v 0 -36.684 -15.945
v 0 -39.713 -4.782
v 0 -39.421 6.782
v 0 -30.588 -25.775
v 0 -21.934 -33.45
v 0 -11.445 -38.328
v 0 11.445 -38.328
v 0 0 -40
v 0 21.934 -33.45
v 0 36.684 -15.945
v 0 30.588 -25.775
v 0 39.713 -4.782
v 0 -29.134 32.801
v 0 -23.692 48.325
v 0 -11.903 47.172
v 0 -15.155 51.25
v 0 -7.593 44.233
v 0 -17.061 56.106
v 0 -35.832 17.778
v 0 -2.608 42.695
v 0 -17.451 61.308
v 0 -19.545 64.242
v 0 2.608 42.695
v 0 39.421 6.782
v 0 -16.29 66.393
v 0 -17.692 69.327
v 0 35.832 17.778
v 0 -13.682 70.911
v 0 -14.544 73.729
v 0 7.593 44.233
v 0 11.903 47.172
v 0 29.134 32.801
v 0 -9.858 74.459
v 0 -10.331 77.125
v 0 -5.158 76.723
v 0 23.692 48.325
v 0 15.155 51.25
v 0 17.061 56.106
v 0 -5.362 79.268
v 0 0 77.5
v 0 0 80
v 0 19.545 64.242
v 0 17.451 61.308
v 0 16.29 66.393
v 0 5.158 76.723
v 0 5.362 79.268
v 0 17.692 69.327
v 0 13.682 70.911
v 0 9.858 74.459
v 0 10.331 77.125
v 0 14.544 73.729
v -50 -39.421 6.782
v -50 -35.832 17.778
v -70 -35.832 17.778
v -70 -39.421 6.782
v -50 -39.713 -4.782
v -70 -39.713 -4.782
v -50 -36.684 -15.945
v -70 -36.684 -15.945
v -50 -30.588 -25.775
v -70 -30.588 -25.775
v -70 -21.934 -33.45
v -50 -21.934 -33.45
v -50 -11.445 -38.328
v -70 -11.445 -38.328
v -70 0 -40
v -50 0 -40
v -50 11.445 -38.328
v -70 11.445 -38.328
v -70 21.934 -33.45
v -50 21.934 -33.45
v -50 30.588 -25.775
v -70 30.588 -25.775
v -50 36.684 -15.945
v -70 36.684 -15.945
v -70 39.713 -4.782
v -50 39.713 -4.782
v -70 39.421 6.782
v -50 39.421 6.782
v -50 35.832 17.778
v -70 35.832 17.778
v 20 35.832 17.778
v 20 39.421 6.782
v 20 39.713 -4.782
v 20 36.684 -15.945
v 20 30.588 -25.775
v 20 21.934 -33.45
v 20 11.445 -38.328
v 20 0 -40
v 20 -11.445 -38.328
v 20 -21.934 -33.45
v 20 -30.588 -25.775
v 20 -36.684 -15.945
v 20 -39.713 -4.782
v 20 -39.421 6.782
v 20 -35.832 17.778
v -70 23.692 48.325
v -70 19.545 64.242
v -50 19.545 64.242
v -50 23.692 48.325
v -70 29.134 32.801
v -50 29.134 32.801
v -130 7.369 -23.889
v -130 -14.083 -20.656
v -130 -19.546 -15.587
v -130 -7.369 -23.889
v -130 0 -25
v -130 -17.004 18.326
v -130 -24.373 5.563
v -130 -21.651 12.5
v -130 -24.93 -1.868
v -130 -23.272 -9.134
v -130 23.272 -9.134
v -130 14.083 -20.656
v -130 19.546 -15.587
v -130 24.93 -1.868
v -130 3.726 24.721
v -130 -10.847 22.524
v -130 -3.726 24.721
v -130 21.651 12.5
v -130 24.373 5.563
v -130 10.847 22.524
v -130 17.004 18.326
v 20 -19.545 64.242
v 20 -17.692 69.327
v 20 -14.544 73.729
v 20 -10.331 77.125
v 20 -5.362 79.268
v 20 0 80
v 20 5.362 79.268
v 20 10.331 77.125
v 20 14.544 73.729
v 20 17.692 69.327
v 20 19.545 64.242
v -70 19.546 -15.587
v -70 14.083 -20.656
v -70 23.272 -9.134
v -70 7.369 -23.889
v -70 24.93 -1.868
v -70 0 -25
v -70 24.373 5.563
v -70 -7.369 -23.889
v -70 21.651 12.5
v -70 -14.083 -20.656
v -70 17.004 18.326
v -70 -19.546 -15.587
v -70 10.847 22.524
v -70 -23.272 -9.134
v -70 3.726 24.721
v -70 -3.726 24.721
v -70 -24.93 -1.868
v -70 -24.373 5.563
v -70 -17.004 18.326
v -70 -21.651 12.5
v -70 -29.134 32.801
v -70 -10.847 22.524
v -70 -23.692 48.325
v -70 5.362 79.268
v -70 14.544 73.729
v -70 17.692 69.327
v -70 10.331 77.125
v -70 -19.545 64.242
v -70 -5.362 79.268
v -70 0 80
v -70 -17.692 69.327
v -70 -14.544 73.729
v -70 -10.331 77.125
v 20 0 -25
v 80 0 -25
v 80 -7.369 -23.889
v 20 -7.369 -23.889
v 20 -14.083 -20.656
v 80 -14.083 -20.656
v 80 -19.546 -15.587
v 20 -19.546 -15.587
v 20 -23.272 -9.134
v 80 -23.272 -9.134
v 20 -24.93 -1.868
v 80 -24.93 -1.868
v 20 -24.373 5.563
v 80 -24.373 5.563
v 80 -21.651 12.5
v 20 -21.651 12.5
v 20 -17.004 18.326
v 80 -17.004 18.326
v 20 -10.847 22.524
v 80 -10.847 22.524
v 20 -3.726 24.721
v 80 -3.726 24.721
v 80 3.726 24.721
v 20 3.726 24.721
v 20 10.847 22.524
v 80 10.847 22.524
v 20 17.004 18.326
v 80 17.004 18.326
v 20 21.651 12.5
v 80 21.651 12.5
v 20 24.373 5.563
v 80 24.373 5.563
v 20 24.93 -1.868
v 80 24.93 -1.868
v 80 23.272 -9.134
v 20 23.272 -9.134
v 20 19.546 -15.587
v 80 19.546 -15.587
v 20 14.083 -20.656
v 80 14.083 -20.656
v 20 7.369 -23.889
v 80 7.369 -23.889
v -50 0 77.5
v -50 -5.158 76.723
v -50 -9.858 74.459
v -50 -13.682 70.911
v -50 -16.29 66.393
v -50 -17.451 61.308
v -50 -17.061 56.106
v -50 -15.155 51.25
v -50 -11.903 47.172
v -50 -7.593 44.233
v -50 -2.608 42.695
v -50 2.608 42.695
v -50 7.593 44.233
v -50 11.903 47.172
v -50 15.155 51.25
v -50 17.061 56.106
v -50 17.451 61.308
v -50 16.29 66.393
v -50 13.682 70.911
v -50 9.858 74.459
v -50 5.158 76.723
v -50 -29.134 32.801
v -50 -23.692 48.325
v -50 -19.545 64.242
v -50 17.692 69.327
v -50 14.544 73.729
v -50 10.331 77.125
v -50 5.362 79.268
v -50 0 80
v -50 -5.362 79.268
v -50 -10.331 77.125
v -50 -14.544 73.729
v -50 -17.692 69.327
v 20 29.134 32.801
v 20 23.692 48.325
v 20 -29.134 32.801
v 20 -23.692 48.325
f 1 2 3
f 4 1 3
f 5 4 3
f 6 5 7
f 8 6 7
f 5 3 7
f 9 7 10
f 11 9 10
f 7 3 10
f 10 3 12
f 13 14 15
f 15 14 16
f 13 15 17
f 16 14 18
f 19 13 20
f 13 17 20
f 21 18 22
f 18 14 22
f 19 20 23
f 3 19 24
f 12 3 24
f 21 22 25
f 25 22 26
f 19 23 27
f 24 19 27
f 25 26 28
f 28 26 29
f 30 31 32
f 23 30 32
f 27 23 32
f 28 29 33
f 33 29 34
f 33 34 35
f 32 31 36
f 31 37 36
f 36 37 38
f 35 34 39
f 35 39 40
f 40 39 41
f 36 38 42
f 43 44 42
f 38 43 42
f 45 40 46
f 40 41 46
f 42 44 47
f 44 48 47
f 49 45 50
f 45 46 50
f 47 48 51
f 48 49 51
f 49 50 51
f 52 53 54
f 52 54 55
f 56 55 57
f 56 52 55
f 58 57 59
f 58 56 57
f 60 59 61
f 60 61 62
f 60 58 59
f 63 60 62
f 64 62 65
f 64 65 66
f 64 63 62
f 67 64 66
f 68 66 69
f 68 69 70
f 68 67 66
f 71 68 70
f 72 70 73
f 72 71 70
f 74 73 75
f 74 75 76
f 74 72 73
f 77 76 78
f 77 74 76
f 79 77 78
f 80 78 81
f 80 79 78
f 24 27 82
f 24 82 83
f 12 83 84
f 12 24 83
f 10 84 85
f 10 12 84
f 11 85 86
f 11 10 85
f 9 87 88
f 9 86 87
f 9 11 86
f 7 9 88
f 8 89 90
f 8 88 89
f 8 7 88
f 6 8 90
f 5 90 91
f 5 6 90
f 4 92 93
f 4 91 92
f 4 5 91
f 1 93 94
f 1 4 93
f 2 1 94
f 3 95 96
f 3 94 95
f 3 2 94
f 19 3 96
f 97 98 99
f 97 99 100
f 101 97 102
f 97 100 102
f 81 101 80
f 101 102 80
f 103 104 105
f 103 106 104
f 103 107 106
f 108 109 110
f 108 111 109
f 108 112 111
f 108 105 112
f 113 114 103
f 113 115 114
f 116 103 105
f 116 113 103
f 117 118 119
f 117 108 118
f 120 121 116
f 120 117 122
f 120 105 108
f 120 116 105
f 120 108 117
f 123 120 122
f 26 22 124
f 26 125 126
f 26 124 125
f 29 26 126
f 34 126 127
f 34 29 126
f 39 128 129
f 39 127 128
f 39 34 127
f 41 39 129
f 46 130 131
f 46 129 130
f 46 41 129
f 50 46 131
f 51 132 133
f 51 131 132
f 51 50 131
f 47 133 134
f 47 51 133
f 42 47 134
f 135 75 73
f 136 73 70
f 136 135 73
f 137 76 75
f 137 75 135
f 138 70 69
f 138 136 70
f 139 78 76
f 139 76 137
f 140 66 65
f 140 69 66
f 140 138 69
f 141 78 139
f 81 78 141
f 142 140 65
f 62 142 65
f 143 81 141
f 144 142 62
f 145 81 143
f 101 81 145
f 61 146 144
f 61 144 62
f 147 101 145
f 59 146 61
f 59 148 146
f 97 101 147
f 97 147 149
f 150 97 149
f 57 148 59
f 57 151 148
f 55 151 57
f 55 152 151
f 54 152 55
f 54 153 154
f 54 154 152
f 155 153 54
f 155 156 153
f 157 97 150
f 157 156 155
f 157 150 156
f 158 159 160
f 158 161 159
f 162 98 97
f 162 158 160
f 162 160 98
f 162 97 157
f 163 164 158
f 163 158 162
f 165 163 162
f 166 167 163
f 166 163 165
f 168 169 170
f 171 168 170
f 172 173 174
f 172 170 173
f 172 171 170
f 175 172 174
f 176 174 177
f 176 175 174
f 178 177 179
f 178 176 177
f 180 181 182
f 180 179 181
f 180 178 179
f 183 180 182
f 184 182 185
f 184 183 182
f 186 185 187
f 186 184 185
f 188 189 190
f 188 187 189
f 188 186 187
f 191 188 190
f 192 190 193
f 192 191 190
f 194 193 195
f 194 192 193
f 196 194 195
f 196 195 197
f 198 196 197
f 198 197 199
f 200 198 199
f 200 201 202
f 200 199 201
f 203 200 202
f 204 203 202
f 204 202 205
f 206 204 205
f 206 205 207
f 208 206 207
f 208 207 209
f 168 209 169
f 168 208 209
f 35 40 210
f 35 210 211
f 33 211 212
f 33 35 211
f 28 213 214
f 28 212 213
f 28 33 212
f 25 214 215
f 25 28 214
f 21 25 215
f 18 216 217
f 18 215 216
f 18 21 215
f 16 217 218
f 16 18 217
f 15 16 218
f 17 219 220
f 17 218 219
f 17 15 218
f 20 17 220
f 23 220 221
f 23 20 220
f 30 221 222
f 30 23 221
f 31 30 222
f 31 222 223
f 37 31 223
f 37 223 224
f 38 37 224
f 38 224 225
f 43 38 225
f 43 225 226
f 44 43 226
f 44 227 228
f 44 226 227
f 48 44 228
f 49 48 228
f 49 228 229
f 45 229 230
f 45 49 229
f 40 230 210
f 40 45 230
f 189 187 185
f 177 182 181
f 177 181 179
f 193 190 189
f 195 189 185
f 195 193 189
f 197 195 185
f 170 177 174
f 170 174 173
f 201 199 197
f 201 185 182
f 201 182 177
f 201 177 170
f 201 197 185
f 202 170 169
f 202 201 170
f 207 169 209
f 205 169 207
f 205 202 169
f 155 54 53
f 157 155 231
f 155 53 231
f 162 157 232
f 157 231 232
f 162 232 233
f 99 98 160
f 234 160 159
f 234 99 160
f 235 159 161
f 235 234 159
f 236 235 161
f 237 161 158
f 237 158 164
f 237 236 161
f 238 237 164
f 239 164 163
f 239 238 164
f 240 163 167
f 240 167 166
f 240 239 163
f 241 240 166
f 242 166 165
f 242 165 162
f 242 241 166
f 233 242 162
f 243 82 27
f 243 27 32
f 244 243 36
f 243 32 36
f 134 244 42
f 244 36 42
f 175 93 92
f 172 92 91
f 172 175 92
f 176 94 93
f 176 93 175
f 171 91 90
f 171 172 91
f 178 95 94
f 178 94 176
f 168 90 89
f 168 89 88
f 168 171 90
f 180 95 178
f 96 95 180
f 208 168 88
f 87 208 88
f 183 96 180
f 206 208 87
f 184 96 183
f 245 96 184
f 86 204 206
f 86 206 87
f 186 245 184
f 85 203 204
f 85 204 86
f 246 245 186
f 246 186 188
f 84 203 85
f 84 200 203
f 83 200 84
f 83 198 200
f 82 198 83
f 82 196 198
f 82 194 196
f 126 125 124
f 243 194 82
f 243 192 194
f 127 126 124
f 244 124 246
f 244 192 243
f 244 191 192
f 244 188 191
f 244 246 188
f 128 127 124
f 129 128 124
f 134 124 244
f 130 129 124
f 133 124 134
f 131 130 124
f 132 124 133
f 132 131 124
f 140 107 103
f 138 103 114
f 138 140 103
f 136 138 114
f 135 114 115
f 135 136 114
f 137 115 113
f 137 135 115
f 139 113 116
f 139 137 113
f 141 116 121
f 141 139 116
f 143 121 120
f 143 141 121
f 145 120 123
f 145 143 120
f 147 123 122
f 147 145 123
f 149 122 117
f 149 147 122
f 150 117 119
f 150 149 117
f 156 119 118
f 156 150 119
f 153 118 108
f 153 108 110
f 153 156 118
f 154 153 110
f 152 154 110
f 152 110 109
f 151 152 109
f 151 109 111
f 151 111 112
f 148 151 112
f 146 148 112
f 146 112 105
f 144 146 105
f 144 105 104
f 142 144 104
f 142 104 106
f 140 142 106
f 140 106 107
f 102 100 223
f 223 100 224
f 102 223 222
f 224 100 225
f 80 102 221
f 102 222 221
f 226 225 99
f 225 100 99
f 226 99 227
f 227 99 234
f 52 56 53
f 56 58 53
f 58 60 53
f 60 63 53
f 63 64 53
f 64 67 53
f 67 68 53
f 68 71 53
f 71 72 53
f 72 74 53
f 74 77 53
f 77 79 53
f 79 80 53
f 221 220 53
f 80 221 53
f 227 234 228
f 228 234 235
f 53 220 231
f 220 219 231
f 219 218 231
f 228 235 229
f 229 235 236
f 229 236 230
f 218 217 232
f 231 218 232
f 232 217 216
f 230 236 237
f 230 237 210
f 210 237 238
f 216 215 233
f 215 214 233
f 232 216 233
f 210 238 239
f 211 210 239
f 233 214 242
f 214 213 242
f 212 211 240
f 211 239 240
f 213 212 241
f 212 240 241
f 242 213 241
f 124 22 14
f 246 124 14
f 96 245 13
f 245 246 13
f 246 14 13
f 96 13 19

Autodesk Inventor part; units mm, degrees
ref_plane "YZ Plane" through (0, 0, 0) normal (1, 0, 0) x (0, 1, 0)
ref_plane "XZ Plane" through (0, 0, 0) normal (0, 1, 0) x (-1, 0, 0)
sketch "Sketch4" plane through (0, 0, 0) normal (1, 0, 0) x (0, 1, 0)
  arc A0 (-35.8323, 17.7778) -> (35.8323, 17.7778) centre (0, 0) ccw
  arc A1 (19.5449, 64.2424) -> (-19.5449, 64.2424) centre (0, 60) ccw
  arc A2 (-35.8323, 17.7778) -> (-19.5449, 64.2424) centre (-214.9935, 106.6667) ccw
  arc A3 (19.5449, 64.2424) -> (35.8323, 17.7778) centre (214.9935, 106.6667) ccw
  dimension "d13" = 80
  dimension "d14" = 40
  dimension "d15" = 60
  dimension "d16" = 200
  dimension "d17" = 200
extrude "Extrusion4" add sketch "Sketch4" along normal blind 20
sketch "Sketch5" plane through (20, 0, 0) normal (1, 0, 0) x (0, 0, -1)
  arc A0 (-17.7778, -35.8323) -> (-17.7778, 35.8323) centre (0, 0) ccw projected
  circle A1 centre (0, 0) radius 25
  dimension "d20" = 50
extrude "Extrusion5" add sketch "Sketch5" along normal blind 60
sketch "Sketch6" plane through (0, 0, 0) normal (-1, 0, 0) x (0, 0, 1)
  arc A0 (64.2424, -19.5449) -> (64.2424, 19.5449) centre (60, 0) ccw projected
  circle A1 centre (60, 0) radius 17.5
  dimension "d23" = 35
extrude "Extrusion6" add sketch "Sketch6" along normal blind 50
ref_plane "Work Plane2" through (-25, 0, 60) normal (-1, 0, 0) x (0, 0, 1)
mirror "Mirror3" about plane through (-25, 0, 60) normal (-1, 0, 0) of "Extrusion4"
mirror "Mirror4" about plane through (-25, 0, 60) normal (-1, 0, 0) of "Extrusion5"
properties part number "crankshaft" material "Silicon Nitride"
